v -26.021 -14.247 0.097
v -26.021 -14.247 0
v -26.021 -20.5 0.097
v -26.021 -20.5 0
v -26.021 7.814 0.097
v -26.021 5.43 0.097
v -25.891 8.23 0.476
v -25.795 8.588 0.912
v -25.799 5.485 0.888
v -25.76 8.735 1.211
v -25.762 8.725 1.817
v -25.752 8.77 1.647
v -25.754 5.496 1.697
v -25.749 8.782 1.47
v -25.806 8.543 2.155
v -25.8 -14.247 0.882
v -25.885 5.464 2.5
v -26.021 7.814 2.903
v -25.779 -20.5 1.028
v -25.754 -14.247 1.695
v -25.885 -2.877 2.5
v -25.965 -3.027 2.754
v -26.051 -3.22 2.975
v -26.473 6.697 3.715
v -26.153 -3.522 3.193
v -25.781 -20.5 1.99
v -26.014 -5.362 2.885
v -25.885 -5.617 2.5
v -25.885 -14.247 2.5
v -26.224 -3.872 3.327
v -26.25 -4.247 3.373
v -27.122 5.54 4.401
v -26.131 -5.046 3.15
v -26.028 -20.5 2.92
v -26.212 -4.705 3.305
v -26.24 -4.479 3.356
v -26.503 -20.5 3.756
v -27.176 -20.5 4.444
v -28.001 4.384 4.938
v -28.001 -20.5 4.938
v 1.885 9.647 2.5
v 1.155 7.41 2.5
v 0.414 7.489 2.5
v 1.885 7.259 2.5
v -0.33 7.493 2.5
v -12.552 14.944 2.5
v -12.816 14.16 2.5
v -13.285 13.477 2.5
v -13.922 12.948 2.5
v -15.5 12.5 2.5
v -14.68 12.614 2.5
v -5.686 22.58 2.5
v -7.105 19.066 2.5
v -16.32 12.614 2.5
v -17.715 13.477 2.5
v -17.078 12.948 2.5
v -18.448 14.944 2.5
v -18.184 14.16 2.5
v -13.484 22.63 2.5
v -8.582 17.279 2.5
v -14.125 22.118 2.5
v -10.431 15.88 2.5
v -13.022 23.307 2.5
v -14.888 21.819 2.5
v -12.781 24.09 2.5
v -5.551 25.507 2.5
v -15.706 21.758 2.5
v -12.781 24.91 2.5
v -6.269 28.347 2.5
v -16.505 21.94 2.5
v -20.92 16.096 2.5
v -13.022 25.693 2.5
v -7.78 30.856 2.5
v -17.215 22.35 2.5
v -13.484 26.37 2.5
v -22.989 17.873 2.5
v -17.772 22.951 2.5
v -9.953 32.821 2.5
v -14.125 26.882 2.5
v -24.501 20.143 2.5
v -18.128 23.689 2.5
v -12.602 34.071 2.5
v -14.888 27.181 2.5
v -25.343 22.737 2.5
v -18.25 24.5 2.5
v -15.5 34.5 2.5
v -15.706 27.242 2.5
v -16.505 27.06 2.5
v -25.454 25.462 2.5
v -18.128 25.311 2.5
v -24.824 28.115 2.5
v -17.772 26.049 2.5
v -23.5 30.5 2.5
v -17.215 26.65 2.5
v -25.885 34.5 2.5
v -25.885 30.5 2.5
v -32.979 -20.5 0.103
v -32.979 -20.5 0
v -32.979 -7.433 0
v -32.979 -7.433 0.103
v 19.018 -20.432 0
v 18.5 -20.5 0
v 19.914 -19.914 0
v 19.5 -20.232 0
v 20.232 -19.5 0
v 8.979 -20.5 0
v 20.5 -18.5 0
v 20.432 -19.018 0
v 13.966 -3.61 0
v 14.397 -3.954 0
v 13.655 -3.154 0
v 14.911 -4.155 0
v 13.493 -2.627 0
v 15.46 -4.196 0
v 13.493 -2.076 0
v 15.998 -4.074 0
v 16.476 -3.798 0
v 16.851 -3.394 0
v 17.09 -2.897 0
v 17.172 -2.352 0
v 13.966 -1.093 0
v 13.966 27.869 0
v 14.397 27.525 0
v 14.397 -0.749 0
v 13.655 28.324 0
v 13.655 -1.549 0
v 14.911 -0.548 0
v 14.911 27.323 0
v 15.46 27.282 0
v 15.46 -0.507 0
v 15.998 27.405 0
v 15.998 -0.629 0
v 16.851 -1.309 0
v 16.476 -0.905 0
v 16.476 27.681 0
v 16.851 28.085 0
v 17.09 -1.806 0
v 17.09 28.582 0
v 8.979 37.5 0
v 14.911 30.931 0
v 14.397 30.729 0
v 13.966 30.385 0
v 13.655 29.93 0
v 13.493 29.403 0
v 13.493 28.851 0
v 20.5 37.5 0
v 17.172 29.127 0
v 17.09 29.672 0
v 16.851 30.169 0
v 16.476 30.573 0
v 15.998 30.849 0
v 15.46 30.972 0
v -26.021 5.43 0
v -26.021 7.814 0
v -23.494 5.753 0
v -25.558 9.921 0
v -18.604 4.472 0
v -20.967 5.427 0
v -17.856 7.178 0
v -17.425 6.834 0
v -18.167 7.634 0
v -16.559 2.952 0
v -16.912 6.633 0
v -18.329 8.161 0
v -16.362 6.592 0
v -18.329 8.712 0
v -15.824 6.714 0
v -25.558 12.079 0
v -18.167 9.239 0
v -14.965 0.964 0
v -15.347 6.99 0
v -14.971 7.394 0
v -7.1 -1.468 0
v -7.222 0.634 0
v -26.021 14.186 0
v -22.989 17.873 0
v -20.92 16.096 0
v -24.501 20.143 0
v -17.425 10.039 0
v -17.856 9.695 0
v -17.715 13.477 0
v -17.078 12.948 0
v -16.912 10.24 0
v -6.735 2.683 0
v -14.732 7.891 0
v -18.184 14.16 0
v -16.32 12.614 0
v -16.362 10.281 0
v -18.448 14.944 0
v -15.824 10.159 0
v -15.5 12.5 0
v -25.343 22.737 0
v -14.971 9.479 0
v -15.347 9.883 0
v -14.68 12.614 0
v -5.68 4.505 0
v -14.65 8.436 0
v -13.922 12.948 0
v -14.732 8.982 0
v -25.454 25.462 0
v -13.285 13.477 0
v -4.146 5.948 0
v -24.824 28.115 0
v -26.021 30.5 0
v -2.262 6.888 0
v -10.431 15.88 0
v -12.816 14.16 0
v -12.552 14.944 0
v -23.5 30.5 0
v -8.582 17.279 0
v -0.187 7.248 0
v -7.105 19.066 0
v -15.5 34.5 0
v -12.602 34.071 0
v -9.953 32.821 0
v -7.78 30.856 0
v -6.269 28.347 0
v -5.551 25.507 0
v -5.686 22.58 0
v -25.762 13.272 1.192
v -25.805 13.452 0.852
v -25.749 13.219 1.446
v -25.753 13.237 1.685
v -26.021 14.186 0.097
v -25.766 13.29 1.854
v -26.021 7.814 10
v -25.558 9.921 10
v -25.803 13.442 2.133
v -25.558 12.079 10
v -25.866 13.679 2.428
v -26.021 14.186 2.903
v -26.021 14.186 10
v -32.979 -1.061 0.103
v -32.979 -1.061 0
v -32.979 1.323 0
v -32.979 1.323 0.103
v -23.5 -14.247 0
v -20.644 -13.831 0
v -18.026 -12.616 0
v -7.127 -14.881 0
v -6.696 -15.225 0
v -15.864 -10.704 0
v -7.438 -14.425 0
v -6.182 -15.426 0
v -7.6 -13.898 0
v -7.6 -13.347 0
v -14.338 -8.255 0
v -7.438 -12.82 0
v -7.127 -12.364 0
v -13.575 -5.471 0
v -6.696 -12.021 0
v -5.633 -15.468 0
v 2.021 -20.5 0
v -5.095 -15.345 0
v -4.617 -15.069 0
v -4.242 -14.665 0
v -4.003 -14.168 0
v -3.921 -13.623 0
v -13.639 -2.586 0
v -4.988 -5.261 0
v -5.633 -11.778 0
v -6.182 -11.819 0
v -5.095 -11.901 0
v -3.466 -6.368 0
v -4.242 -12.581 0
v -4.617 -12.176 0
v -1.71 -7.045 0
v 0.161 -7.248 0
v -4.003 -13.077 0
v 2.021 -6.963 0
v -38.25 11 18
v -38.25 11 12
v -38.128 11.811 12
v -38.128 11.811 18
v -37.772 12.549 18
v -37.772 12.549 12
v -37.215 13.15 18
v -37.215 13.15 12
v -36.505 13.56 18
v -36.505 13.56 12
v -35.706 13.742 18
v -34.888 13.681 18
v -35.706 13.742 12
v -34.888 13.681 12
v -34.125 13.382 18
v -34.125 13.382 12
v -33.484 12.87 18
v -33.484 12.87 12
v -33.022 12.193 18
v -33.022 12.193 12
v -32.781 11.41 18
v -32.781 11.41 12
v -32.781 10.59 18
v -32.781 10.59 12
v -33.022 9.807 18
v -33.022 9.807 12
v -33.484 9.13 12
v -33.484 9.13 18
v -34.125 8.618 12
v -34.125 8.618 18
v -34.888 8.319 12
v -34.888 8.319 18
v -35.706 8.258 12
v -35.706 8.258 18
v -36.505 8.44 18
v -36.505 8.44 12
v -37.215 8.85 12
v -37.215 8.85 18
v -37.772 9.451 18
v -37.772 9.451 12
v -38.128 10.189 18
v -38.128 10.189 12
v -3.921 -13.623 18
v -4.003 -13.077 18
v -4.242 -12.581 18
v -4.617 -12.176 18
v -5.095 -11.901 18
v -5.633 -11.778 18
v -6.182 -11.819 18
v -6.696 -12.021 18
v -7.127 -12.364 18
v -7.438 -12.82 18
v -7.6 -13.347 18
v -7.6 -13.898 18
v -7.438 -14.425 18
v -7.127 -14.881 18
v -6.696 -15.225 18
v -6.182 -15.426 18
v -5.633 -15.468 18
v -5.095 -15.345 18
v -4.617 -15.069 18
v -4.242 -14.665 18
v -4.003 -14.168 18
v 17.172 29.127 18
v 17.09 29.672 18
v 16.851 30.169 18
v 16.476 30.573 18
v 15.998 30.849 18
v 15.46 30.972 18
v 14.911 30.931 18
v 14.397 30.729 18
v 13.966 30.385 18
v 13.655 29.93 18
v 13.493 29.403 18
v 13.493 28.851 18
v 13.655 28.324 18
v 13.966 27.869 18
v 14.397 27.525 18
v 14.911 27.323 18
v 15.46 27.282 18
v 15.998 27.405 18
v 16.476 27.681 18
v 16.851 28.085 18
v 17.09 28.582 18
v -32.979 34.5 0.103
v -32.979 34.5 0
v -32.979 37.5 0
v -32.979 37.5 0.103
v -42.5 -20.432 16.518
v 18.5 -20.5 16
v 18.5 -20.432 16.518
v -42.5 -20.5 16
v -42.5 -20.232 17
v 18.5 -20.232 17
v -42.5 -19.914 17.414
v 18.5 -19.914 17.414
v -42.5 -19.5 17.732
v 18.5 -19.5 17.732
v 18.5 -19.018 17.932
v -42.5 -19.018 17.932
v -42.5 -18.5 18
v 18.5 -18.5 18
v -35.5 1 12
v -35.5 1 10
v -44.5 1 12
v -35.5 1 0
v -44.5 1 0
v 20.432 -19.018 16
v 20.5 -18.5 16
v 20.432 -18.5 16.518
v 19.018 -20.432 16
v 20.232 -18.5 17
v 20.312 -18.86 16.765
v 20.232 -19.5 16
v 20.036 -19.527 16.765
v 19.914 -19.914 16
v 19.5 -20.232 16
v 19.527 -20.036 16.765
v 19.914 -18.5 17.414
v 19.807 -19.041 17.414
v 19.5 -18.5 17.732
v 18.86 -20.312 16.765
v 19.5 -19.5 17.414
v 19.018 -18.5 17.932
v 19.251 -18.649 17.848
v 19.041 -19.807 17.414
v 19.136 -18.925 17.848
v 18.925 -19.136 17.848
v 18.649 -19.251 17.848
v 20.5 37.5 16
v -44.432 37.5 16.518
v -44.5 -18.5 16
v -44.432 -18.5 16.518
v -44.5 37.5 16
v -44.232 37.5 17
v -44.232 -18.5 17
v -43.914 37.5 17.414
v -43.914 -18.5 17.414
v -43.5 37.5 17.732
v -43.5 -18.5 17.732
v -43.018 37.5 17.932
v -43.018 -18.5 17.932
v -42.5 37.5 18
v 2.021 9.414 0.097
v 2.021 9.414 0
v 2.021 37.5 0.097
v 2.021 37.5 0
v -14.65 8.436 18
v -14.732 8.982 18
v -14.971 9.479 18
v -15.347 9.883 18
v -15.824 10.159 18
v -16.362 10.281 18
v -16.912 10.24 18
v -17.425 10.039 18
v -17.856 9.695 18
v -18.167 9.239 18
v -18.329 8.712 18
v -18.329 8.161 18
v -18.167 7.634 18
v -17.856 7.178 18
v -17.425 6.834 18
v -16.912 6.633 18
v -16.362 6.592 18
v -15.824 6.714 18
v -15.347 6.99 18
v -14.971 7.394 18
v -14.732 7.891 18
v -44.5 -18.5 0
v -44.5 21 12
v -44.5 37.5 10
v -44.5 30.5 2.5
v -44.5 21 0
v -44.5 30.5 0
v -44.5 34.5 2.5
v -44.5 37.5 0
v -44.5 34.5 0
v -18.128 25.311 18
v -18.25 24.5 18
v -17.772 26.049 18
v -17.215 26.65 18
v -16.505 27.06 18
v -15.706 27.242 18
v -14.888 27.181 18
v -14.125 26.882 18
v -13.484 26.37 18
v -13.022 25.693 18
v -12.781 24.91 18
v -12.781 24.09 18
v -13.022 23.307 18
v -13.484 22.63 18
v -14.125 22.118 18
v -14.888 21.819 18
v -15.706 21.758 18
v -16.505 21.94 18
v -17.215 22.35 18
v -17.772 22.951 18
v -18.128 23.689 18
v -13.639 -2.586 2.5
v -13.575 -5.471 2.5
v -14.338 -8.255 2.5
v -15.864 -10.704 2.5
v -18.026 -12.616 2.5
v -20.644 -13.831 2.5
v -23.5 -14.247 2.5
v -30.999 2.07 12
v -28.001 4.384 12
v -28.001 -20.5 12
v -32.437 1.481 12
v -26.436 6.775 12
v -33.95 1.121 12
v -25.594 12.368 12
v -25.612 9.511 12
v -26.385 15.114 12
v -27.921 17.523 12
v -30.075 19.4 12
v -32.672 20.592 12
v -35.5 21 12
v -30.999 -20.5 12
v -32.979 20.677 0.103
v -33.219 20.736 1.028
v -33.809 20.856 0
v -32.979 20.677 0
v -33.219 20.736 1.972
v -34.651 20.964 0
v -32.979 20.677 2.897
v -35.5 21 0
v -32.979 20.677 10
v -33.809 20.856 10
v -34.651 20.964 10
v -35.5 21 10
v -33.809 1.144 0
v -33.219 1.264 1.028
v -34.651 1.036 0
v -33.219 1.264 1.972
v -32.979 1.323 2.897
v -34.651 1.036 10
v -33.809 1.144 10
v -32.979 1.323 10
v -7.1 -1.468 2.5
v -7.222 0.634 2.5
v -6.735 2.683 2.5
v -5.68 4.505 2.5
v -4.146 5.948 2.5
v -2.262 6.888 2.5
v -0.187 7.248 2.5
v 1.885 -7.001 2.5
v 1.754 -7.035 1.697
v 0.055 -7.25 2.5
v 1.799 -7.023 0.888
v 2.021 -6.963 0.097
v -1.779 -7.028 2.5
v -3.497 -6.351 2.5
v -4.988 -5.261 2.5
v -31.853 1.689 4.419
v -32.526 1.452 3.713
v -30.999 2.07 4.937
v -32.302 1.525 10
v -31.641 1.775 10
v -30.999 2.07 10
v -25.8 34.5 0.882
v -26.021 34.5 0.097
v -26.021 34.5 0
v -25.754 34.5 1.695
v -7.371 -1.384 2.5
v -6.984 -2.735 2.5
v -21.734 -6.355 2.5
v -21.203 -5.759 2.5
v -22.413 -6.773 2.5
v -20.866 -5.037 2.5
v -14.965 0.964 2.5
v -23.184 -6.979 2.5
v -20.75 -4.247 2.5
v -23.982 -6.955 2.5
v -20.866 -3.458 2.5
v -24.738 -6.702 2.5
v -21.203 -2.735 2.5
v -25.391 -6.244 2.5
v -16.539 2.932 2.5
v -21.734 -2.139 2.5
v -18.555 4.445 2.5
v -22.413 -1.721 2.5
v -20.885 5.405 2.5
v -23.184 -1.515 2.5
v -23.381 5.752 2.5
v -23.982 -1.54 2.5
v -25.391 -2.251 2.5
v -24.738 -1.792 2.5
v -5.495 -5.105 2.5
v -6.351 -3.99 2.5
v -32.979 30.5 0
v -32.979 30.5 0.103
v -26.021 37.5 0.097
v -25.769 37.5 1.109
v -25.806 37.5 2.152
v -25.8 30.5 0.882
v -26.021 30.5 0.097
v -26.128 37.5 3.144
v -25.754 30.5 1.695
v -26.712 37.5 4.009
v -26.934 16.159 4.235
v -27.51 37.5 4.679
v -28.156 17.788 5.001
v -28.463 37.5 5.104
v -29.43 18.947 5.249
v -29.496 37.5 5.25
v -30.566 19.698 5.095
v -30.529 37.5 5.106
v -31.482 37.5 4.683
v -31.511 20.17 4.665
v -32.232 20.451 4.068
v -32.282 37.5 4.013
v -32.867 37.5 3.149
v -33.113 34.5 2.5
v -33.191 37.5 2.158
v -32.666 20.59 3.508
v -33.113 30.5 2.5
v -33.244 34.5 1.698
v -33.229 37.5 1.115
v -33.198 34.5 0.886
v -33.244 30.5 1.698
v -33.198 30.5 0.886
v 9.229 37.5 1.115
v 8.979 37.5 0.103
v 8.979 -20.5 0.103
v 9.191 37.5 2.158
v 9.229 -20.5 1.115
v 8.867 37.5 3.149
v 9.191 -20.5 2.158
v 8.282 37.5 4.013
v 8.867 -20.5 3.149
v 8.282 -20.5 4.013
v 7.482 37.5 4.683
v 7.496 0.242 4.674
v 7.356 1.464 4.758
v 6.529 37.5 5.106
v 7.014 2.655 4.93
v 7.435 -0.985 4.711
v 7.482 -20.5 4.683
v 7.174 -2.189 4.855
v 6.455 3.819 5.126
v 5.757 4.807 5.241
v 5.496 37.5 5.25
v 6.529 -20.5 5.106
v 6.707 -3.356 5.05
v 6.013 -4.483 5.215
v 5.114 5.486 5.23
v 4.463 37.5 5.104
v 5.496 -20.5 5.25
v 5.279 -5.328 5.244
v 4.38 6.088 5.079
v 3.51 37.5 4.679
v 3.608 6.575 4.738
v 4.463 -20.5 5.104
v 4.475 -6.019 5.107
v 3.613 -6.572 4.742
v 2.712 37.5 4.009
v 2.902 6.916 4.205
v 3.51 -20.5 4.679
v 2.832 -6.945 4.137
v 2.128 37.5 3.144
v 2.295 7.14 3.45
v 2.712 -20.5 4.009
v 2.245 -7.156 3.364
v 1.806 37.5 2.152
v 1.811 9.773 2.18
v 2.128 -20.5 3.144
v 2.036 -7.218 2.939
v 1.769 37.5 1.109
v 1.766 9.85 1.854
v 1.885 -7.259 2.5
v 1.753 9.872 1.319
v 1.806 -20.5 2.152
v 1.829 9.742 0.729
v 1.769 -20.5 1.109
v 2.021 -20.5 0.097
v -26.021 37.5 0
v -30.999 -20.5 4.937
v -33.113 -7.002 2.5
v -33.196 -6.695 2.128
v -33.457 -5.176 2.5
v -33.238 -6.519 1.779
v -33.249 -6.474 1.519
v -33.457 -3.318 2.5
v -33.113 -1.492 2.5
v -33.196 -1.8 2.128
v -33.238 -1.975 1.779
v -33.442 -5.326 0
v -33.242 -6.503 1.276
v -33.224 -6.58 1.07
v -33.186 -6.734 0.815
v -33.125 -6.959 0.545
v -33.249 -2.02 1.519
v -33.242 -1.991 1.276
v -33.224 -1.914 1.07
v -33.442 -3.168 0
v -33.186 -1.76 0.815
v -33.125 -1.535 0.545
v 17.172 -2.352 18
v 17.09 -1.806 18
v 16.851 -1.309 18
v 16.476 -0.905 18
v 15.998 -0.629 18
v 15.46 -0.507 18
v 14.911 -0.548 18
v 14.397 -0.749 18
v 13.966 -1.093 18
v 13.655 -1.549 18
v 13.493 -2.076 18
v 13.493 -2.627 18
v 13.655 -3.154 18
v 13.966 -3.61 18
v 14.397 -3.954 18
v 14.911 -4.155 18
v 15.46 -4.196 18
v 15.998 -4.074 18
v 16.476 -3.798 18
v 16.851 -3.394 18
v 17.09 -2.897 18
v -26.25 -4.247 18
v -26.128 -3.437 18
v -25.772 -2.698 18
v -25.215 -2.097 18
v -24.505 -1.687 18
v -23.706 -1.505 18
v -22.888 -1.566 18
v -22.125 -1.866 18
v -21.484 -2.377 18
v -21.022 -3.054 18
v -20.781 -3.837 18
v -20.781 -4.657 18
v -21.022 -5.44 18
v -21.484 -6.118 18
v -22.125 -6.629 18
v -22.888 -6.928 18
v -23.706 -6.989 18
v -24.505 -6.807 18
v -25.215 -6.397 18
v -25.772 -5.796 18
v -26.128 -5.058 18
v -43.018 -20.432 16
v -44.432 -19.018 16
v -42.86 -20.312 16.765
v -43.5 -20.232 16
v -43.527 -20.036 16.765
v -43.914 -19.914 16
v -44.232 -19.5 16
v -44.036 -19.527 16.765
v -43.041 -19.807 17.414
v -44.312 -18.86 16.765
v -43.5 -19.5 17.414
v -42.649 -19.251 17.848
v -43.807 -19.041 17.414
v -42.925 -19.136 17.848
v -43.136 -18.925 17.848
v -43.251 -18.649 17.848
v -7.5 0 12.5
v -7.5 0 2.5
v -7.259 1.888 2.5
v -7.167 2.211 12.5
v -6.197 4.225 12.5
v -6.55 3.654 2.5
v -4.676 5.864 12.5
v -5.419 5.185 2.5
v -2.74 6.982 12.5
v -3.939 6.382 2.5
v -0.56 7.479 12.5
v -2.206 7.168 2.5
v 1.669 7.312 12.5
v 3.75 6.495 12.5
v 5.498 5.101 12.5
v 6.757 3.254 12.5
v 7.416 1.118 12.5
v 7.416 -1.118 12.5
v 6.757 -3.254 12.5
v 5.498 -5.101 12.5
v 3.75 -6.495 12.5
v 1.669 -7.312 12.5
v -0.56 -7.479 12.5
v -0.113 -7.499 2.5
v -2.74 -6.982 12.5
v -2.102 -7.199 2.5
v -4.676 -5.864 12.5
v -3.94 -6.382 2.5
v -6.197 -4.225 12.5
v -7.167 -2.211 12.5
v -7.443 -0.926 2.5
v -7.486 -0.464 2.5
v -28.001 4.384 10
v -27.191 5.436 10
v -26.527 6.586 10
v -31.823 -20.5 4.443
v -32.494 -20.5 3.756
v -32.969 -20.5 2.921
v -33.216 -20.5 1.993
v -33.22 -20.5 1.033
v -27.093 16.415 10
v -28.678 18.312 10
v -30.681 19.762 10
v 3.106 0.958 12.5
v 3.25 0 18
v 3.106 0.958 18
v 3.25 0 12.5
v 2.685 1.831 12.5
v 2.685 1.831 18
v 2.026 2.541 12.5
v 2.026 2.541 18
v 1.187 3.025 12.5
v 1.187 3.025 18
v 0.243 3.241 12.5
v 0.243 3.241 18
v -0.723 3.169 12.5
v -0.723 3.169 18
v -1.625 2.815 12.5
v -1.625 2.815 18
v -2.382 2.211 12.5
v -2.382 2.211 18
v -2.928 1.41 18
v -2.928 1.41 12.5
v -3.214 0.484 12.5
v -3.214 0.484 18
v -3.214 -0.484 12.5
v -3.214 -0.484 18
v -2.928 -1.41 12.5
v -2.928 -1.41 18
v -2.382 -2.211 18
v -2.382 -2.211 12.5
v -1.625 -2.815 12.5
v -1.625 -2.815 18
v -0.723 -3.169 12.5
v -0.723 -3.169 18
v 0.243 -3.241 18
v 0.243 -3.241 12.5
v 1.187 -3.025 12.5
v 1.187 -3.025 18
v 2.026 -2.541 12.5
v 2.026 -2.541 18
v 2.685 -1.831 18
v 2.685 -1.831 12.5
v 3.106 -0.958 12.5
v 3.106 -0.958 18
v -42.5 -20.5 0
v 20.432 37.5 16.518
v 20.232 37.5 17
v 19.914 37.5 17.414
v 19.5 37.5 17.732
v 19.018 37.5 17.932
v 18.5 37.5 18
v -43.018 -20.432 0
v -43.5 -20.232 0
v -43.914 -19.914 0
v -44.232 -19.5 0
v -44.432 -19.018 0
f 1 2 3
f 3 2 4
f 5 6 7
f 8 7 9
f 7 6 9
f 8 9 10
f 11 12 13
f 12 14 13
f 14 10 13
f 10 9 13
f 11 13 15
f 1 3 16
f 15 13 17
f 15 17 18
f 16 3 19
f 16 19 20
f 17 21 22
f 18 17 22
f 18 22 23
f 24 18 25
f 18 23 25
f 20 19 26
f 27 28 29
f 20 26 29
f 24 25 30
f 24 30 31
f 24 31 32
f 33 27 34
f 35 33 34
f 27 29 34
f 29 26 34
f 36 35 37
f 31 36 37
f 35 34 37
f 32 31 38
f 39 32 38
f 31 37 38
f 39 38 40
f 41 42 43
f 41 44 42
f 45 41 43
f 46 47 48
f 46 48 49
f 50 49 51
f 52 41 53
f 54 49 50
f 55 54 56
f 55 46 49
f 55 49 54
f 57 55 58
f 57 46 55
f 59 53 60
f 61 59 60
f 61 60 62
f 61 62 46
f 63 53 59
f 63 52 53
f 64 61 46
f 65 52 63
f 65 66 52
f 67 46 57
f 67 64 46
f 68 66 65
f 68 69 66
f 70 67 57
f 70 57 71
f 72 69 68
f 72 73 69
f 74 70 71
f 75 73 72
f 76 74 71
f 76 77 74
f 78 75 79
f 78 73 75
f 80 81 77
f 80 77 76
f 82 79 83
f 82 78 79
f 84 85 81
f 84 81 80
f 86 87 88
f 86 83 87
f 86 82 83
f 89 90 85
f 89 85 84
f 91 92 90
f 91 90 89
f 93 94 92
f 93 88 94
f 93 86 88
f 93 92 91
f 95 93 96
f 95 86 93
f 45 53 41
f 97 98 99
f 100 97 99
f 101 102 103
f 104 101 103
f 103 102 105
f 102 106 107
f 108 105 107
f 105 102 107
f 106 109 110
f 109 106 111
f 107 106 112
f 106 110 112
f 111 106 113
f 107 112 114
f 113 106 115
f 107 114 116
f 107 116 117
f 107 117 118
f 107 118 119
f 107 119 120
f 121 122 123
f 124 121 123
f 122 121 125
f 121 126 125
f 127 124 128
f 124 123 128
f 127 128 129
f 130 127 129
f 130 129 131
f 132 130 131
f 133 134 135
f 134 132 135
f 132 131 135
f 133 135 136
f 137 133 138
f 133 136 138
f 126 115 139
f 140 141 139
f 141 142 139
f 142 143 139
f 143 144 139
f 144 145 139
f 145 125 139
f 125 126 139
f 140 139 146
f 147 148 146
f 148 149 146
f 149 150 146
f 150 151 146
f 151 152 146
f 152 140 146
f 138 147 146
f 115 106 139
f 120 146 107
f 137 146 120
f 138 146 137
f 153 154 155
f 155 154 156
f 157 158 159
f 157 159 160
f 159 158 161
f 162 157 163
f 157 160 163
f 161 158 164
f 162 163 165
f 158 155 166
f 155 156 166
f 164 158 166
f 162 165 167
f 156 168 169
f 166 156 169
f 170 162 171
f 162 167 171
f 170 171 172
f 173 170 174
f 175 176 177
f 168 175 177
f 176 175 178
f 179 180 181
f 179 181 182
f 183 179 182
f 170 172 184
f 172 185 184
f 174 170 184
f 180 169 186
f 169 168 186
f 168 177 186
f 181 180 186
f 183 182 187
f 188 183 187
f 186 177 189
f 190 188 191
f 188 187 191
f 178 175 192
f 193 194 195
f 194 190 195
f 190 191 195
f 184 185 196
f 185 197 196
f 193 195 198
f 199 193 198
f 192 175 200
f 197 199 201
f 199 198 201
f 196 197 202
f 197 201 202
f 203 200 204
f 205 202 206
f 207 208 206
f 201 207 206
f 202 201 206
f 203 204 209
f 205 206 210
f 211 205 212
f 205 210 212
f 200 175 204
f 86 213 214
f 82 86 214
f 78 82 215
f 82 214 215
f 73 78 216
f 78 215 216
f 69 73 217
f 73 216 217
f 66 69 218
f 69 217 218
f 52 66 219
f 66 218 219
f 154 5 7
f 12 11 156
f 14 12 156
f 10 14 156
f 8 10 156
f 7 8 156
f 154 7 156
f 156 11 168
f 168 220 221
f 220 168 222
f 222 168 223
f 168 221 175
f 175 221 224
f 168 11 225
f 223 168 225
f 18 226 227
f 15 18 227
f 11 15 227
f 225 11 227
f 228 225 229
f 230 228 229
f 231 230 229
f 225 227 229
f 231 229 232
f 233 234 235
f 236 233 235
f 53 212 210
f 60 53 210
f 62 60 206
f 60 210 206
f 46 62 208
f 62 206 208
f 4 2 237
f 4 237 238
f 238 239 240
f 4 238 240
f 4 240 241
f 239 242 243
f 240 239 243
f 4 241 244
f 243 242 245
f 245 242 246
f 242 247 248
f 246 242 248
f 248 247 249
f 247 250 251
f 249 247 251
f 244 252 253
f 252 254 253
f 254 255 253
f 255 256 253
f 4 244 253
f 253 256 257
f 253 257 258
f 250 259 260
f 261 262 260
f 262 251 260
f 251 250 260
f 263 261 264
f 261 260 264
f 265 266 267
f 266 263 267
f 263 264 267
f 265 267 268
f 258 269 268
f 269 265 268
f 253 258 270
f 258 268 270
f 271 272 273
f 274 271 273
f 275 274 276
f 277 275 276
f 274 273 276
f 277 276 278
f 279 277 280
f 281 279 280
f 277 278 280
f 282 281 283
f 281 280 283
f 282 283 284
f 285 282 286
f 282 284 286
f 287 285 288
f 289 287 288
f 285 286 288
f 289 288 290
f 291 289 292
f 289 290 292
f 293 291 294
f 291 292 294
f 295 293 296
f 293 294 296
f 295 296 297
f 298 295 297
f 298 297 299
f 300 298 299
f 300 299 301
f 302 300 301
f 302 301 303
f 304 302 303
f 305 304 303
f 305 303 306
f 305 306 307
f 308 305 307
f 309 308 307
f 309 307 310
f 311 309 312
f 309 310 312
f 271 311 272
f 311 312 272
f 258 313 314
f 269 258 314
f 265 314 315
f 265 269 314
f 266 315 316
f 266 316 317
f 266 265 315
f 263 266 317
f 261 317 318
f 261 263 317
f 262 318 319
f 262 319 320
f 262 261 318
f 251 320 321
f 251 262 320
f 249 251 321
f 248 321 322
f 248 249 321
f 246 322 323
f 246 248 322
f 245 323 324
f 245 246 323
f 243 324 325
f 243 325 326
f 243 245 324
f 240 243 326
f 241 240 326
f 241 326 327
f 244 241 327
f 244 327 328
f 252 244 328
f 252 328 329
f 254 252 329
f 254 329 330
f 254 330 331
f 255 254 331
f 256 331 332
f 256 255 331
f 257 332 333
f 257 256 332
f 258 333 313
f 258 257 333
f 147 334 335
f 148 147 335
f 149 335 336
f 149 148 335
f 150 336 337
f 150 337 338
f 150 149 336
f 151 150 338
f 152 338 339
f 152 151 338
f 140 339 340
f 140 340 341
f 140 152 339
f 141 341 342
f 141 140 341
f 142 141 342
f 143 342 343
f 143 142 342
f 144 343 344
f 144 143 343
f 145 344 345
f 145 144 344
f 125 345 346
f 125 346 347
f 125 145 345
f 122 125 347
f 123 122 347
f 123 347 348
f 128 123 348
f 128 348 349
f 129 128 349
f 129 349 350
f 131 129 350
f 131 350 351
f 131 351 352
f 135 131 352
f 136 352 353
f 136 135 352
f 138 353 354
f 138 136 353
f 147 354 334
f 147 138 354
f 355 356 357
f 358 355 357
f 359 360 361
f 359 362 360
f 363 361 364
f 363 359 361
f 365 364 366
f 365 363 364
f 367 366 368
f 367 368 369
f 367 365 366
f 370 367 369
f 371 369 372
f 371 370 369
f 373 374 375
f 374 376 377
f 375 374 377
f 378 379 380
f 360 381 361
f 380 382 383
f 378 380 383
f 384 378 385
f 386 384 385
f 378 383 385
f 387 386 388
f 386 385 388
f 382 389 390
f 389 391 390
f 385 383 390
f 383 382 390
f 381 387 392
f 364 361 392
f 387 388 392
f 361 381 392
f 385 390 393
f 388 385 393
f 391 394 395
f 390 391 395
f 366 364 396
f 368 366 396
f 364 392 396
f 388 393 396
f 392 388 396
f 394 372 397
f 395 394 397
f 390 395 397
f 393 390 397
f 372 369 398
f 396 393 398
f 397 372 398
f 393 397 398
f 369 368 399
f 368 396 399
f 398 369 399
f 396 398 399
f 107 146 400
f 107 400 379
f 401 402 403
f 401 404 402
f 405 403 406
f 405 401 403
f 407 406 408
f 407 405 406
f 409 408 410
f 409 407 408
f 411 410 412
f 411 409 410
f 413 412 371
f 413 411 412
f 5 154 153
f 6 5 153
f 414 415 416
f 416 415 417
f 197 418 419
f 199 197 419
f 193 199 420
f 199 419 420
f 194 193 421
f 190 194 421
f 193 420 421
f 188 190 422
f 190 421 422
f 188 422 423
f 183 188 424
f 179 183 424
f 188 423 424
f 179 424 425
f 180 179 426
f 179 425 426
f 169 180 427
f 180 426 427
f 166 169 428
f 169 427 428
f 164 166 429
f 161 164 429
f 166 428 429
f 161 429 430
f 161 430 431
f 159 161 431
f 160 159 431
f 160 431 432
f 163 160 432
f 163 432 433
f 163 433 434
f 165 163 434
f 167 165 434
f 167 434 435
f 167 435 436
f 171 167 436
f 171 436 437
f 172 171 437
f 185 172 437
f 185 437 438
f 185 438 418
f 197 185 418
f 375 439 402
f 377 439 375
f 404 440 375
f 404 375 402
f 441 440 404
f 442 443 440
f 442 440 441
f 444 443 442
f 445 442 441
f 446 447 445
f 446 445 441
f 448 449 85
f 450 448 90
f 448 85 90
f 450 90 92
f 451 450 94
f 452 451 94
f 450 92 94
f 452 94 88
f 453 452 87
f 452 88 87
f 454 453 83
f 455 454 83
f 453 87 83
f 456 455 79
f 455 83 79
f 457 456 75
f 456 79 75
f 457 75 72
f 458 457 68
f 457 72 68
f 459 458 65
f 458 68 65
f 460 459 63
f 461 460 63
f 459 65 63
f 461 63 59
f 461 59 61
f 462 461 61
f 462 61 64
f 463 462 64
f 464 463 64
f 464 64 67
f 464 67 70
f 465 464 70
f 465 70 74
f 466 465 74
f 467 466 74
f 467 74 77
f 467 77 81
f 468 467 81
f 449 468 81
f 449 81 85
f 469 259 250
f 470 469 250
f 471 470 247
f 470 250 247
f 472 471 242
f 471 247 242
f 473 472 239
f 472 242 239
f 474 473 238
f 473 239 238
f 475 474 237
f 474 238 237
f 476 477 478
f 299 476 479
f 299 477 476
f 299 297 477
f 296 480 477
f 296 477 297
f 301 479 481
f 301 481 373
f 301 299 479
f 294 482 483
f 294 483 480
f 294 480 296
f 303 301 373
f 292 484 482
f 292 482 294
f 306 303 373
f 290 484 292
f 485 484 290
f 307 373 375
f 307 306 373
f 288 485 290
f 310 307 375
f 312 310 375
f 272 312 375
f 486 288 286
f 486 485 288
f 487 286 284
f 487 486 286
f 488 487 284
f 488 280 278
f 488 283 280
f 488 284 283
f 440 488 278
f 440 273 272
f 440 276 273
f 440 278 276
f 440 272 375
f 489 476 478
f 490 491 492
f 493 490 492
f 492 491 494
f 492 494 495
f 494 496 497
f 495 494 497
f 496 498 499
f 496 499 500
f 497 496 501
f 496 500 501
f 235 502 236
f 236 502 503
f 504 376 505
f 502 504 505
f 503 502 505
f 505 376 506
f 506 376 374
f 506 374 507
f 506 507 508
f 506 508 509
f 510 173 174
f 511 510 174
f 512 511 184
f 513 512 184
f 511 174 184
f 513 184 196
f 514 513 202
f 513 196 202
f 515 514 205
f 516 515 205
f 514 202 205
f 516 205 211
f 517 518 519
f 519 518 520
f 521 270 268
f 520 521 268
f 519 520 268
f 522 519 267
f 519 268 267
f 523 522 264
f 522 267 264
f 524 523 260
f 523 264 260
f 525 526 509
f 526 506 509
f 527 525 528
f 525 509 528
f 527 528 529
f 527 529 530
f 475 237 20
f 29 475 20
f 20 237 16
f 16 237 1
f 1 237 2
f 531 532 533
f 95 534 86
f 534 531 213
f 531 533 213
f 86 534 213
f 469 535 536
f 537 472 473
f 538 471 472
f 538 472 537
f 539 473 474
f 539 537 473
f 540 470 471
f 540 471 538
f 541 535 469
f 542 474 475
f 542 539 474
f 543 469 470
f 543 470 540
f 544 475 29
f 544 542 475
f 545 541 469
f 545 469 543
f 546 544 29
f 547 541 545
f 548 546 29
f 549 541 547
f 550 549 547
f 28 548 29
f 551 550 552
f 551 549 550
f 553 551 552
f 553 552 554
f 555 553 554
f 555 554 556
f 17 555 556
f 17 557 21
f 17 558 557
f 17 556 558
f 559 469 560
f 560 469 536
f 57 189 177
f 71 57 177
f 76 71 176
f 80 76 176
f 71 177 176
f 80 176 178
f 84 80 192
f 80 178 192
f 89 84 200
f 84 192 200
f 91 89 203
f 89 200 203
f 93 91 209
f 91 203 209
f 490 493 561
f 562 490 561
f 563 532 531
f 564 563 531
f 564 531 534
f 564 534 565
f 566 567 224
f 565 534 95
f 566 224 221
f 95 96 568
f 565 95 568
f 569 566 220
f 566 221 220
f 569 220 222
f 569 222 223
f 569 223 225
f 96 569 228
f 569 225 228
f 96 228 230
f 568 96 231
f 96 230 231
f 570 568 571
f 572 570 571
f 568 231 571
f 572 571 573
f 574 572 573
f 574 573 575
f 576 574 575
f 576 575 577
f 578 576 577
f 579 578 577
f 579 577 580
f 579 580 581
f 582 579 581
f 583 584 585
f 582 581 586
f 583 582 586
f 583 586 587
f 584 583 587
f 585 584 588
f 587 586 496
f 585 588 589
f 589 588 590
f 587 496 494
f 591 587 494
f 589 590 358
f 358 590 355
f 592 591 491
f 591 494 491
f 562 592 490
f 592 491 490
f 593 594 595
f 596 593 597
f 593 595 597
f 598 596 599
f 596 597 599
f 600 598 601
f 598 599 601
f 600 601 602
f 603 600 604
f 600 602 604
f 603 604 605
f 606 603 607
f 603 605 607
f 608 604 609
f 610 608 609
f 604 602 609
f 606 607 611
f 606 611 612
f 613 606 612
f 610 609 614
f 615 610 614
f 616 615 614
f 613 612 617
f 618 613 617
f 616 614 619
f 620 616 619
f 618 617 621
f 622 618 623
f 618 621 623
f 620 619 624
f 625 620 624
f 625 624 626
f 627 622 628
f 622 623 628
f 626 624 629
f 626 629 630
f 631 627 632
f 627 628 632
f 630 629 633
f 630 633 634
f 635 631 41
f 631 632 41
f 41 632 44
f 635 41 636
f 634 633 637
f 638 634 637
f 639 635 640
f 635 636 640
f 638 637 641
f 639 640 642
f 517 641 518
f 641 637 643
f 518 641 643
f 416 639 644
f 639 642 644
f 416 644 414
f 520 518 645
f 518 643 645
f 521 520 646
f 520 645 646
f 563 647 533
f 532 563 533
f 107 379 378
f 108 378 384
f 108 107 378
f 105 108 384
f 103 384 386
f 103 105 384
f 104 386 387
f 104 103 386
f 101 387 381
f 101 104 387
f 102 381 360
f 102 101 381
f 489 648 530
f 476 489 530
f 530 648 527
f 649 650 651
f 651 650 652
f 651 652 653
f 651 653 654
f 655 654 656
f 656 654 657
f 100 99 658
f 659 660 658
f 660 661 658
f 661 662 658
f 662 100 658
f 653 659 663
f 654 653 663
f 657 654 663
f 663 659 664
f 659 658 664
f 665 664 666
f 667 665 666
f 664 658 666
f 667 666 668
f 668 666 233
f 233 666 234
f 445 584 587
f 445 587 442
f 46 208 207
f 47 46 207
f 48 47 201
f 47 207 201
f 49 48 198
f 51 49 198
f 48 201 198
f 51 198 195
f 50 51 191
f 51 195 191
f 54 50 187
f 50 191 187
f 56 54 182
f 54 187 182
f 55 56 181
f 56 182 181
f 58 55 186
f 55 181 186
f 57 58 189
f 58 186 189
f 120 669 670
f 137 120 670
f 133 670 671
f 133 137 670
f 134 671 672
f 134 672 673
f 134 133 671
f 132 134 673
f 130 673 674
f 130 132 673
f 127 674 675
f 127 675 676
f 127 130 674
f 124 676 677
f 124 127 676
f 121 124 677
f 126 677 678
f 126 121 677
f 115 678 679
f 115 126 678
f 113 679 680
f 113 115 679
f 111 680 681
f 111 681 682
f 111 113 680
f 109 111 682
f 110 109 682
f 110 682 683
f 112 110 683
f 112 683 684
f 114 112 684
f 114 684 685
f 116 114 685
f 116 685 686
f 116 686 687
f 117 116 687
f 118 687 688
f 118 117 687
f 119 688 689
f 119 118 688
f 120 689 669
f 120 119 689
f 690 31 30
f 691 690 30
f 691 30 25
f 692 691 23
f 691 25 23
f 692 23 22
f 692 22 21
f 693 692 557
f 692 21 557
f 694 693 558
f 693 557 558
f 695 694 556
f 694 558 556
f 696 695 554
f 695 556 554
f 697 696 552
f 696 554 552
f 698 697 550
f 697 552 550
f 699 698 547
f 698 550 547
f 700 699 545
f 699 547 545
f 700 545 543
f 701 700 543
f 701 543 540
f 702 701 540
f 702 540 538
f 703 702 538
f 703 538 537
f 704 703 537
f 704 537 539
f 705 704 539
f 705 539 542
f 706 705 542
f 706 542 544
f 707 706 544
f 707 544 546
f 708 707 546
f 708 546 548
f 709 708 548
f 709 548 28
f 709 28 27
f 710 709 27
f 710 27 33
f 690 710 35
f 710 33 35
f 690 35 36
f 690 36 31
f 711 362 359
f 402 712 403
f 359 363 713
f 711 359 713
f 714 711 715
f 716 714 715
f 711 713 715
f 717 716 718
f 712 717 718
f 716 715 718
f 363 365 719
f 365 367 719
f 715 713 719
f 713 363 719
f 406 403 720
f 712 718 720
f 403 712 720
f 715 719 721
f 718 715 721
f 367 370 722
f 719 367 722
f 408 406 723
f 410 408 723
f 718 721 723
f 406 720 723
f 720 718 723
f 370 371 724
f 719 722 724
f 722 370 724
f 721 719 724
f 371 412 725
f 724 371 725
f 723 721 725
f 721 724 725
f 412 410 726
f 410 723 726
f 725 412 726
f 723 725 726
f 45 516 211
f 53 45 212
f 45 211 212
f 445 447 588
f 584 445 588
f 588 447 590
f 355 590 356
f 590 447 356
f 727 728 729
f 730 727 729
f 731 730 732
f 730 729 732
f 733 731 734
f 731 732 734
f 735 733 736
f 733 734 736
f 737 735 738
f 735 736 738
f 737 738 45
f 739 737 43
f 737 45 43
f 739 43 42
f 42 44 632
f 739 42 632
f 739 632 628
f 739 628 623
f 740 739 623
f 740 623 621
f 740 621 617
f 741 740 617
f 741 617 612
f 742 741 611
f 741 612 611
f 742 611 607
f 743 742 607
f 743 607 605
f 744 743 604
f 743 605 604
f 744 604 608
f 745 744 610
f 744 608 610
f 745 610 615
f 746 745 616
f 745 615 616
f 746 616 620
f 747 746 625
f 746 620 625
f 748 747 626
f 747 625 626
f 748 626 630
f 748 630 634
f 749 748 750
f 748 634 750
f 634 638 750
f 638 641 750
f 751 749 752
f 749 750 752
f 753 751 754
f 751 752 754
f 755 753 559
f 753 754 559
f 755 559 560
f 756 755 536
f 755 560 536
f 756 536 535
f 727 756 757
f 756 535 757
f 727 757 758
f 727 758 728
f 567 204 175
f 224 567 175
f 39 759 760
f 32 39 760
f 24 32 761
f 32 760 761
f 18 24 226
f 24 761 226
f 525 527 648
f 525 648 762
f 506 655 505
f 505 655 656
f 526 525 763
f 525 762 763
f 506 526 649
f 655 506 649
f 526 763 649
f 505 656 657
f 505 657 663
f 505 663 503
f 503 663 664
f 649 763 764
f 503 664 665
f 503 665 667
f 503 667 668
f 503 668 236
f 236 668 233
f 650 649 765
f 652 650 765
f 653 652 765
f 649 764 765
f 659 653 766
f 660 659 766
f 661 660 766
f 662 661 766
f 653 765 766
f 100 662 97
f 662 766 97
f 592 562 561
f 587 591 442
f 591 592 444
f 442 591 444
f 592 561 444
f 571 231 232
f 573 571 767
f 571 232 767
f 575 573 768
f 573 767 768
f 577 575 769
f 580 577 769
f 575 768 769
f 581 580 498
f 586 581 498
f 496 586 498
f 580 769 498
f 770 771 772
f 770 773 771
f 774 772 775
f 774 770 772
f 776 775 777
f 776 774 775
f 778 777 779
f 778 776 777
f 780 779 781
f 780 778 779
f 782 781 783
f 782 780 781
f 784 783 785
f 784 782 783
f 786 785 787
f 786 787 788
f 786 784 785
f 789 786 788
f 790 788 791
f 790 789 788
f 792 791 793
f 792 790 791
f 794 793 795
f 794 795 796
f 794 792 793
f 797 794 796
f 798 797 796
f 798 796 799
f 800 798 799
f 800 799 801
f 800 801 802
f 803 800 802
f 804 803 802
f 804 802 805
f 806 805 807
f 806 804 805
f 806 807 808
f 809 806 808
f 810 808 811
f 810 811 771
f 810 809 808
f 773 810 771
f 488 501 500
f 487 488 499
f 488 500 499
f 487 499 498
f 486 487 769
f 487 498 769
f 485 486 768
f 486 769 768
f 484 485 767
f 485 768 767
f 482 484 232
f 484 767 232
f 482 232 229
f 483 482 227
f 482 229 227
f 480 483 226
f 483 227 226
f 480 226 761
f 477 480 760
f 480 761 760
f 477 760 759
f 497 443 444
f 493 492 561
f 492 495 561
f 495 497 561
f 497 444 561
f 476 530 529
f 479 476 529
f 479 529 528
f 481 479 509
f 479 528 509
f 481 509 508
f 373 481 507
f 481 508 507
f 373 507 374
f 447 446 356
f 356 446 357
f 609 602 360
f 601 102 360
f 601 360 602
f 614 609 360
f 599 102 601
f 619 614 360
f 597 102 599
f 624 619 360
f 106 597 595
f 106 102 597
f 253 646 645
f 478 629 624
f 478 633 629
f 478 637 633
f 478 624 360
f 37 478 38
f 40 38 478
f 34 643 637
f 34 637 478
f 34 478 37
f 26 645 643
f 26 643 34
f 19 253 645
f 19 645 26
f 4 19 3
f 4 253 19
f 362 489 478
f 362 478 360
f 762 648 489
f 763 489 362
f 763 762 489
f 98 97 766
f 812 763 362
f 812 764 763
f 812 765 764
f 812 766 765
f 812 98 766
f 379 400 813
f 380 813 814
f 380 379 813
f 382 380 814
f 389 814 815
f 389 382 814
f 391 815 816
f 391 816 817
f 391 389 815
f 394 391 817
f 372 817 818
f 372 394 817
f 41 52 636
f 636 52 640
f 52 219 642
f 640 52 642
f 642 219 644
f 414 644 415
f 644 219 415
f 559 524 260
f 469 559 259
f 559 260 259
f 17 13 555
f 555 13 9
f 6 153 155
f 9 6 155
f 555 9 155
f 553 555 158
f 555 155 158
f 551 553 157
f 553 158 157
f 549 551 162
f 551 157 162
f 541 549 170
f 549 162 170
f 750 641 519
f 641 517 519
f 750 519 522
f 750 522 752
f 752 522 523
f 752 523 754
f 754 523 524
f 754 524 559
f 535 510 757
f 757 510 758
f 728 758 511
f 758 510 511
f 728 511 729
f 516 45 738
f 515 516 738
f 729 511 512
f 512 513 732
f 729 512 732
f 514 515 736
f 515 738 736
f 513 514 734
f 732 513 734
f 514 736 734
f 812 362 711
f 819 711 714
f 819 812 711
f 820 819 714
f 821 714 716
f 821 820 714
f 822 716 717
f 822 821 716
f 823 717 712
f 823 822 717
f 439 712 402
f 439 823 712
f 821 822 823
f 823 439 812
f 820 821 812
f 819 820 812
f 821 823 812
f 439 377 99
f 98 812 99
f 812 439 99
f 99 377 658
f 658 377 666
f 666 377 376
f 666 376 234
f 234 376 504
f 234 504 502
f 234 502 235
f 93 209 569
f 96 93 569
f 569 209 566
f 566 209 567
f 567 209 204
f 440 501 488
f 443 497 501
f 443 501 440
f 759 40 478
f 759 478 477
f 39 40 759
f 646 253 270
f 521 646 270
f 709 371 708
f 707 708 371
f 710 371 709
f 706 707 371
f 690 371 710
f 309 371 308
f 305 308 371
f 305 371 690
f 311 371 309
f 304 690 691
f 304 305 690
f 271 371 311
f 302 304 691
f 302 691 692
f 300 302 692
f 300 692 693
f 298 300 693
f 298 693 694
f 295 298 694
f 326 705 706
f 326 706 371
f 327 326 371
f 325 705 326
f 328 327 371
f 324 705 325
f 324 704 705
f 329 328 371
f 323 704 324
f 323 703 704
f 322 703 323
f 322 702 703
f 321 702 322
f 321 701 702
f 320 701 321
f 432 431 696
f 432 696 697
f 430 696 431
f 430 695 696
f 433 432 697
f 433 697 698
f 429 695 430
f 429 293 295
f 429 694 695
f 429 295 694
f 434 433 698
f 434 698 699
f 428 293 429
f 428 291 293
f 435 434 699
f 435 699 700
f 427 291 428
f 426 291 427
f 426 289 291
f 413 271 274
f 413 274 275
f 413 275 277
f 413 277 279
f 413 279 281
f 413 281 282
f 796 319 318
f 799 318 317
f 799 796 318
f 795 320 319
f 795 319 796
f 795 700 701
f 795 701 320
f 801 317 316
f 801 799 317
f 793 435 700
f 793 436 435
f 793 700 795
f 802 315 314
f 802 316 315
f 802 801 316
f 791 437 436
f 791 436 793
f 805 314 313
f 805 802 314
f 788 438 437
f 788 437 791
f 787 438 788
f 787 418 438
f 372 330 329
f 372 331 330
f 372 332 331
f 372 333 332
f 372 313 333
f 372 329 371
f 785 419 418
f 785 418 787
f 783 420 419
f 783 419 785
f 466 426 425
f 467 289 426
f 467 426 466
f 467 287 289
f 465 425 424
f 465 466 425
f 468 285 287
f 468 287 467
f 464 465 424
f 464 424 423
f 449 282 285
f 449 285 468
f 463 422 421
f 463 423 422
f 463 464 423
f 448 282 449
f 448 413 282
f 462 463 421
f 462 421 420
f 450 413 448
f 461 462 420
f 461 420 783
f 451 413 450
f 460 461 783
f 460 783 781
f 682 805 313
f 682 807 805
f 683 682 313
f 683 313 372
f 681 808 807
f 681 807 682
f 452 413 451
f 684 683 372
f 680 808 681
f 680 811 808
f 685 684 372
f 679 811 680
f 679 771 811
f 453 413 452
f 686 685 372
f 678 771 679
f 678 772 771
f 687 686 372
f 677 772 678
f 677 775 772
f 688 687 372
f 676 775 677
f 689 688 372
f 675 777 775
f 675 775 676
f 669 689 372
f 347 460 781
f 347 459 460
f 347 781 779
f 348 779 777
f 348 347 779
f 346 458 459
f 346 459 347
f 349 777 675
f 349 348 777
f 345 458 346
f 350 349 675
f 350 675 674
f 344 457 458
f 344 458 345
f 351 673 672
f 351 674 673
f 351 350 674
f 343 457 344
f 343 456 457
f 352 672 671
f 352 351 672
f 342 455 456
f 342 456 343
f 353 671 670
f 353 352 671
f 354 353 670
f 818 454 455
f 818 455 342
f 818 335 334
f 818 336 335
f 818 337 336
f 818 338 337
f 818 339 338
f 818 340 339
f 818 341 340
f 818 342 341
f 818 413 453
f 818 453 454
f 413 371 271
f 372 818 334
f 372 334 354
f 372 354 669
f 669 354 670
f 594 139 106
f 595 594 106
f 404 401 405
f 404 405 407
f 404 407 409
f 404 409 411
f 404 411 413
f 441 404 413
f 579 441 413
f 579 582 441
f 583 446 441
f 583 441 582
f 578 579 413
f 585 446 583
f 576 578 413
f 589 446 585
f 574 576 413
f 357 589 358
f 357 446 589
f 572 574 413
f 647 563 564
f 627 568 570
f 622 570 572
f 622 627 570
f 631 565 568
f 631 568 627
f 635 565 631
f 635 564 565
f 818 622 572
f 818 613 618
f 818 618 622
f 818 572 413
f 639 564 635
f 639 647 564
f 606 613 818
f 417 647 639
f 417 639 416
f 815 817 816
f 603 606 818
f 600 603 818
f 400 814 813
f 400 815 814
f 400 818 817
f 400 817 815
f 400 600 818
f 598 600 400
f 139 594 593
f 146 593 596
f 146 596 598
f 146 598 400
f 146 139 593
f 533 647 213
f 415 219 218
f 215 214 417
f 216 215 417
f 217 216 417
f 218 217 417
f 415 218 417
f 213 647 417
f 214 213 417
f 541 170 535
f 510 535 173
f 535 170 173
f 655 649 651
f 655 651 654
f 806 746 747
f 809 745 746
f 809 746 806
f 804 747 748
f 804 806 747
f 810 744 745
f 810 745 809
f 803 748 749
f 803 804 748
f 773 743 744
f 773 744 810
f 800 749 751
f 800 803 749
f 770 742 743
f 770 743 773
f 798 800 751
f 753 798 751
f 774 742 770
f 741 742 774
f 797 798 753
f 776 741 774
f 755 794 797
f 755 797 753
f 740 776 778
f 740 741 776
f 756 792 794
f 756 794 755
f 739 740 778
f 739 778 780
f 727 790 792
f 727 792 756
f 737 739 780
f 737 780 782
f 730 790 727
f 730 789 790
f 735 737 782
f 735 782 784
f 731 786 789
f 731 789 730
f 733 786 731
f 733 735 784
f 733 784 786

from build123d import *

# Parameters (mm, degrees)
SKETCH1_W             = 11.521135243
SKETCH1_H             = 3
BOSS_EXTRUDE1_DEPTH   = 10
SKETCH1_R             = 1.85
BOSS_EXTRUDE1_2_DEPTH = 10
BOSS_EXTRUDE1_3_DEPTH = 10
BOSS_EXTRUDE1_4_DEPTH = 10
BOSS_EXTRUDE1_5_DEPTH = 10
BOSS_EXTRUDE1_6_DEPTH = 10
SKETCH2_R             = 10
CUT_EXTRUDE1_DEPTH    = 11
SKETCH3_R             = 3.25
BOSS_EXTRUDE2_DEPTH   = 7.5
SKETCH4_R             = 1.85
SKETCH4_R_2           = 3.25
BOSS_EXTRUDE3_DEPTH   = 2
SKETCH5_R             = 3.25
SKETCH5_R_2           = 1.85
BOSS_EXTRUDE4_DEPTH   = 6
FILLET1_R             = 2
SKETCH6_W             = 9
SKETCH6_H             = 20
CUT_EXTRUDE2_DEPTH    = 12
SKETCH7_W             = 2.997729514
SKETCH7_H             = 29.62259405
CUT_EXTRUDE3_DEPTH    = 9.5
SKETCH8_R             = 2.75
CUT_EXTRUDE4_DEPTH    = 6
SKETCH9_R             = 2.75
CUT_EXTRUDE5_DEPTH    = 16.5
SKETCH10_R            = 1.85
CUT_EXTRUDE6_DEPTH    = 25
SKETCH11_R            = 1.85
BOSS_EXTRUDE5_DEPTH   = 18
SKETCH12_R            = 3.75
CUT_EXTRUDE7_DEPTH    = 59
SKETCH13_R            = 7.5
CUT_EXTRUDE8_DEPTH    = 10


with BuildPart() as part:
    # Sketch1 → Boss-Extrude1 (new body)
    with BuildSketch(Plane.XY):
        with Locations((-38.739432378, 36)):
            Rectangle(SKETCH1_W, SKETCH1_H)
    extrude(amount=BOSS_EXTRUDE1_DEPTH)



with BuildPart() as body_2:
    # Sketch1 → Boss-Extrude1 2 (new body)
    with BuildSketch(Plane.XY):
        with BuildLine():
            Line((-26.021135243, 30.5), (-26.021135243, 5.429840229))
            ThreePointArc((-26.021135243, 5.429840229), (-19.754753142, 5.025033011), (-14.965174817, 0.964078321))
            Line((-14.965174817, 0.964078321), (-7.099804938, -1.468083732))
            ThreePointArc((-7.099804938, -1.468083732), (-5.680207241, 4.505301955), (-0.18689792, 7.247590577))
            Line((-0.18689792, 7.247590577), (-7.105071526, 19.066292618))
            ThreePointArc((-7.105071526, 19.066292618), (-9.465636422, 16.525888375), (-12.551889075, 14.944444444))
            ThreePointArc((-12.551889075, 14.944444444), (-15.5, 12.5), (-18.448110925, 14.944444444))
            ThreePointArc((-18.448110925, 14.944444444), (-25.010999441, 21.411166946), (-23.5, 30.5))
            Line((-23.5, 30.5), (-26.021135243, 30.5))
        make_face()
        with Locations((-10.762282528, 8.436432064)):
            Circle(SKETCH1_R, mode=Mode.SUBTRACT)
    extrude(amount=BOSS_EXTRUDE1_2_DEPTH)


with BuildPart() as body_3:
    # Sketch1 → Boss-Extrude1 3 (new body)
    with BuildSketch(Plane.XY):
        with BuildLine():
            Line((-26.021135243, 37.5), (-26.021135243, 34.5))
            Line((-26.021135243, 34.5), (-15.5, 34.5))
            ThreePointArc((-15.5, 34.5), (-7.78005297, 30.856289629), (-5.685956151, 22.58048357))
            Line((-5.685956151, 22.58048357), (2.021135243, 9.414029247))
            Line((2.021135243, 9.414029247), (2.021135243, 37.5))
            Line((2.021135243, 37.5), (-26.021135243, 37.5))
        make_face()
    extrude(amount=BOSS_EXTRUDE1_3_DEPTH)


with BuildPart() as body_4:
    # Sketch1 → Boss-Extrude1 4 (new body)
    with BuildSketch(Plane.XY):
        with BuildLine():
            Line((8.978864757, 37.5), (8.978864757, -20.5))
            Line((8.978864757, -20.5), (18.5, -20.5))
            ThreePointArc((18.5, -20.5), (19.914213562, -19.914213562), (20.5, -18.5))
            Line((20.5, -18.5), (20.5, 37.5))
            Line((20.5, 37.5), (8.978864757, 37.5))
        make_face()
        with Locations((15.322226869, 29.126922543)):
            Circle(SKETCH1_R, mode=Mode.SUBTRACT)
        with Locations((15.322226869, -2.351605773)):
            Circle(SKETCH1_R, mode=Mode.SUBTRACT)
    extrude(amount=BOSS_EXTRUDE1_4_DEPTH)


with BuildPart() as body_5:
    # Sketch1 → Boss-Extrude1 5 (new body)
    with BuildSketch(Plane.XY):
        with BuildLine():
            Line((-26.021135243, -14.247136421), (-26.021135243, -20.5))
            Line((-26.021135243, -20.5), (2.021135243, -20.5))
            Line((2.021135243, -20.5), (2.021135243, -6.962579431))
            ThreePointArc((2.021135243, -6.962579431), (-1.710141081, -7.045418191), (-4.98822277, -5.261191271))
            Line((-4.98822277, -5.261191271), (-13.638901361, -2.586192825))
            ThreePointArc((-13.638901361, -2.586192825), (-15.864247386, -10.70432482), (-23.5, -14.247136421))
            Line((-23.5, -14.247136421), (-26.021135243, -14.247136421))
        make_face()
        with Locations((-5.770802335, -13.622690081)):
            Circle(SKETCH1_R, mode=Mode.SUBTRACT)
    extrude(amount=BOSS_EXTRUDE1_5_DEPTH)


with BuildPart() as body_6:
    # Sketch1 → Boss-Extrude1 6 (new body)
    with BuildSketch(Plane.XY):
        with BuildLine():
            Line((-32.978864757, 12.098351987), (-32.978864757, 30.5))
            Line((-32.978864757, 30.5), (-44.5, 30.5))
            Line((-44.5, 30.5), (-44.5, -18.5))
            ThreePointArc((-44.5, -18.5), (-43.914213562, -19.914213562), (-42.5, -20.5))
            Line((-42.5, -20.5), (-32.978864757, -20.5))
            Line((-32.978864757, -20.5), (-32.978864757, -7.433219111))
            ThreePointArc((-32.978864757, -7.433219111), (-33.5, -4.247136421), (-32.978864757, -1.06105373))
            Line((-32.978864757, -1.06105373), (-32.978864757, 9.901648013))
            ThreePointArc((-32.978864757, 9.901648013), (-38.25, 11), (-32.978864757, 12.098351987))
        make_face()
    extrude(amount=BOSS_EXTRUDE1_6_DEPTH)


with BuildPart() as cut_extrude1_tool:
    # Sketch2 → Cut-Extrude1 (new body, through all)
    with BuildSketch(Plane.XY.offset(10)):
        with Locations((-35.5, 11)):
            Circle(SKETCH2_R)
    extrude(amount=-CUT_EXTRUDE1_DEPTH)


with BuildPart() as body_2_1:
    add(body_2.part)

    # Cut-Extrude1: cut by cut_extrude1_tool
    add(cut_extrude1_tool.part, mode=Mode.SUBTRACT)


with BuildPart() as body_6_1:
    add(body_6.part)

    # Cut-Extrude1: cut by cut_extrude1_tool
    add(cut_extrude1_tool.part, mode=Mode.SUBTRACT)


with BuildPart() as part_1:
    add(part.part)

    add(body_2_1.part)  # Boss-Extrude2 merges body 2

    add(body_3.part)  # Boss-Extrude2 merges body 3

    add(body_4.part)  # Boss-Extrude2 merges body 4

    add(body_5.part)  # Boss-Extrude2 merges body 5

    add(body_6_1.part)  # Boss-Extrude2 merges body 6
    # Sketch3 → Boss-Extrude2 (add)
    with BuildSketch(Plane.XY.offset(10)):
        with BuildLine():
            Line((-32.978864757, 20.67697665), (-32.978864757, 30.5))
            Line((-32.978864757, 30.5), (-44.5, 30.5))
            Line((-44.5, 30.5), (-44.5, 34.5))
            Line((-44.5, 34.5), (-32.978864757, 34.5))
            Line((-32.978864757, 34.5), (-32.978864757, 37.5))
            Line((-32.978864757, 37.5), (-26.021135243, 37.5))
            Line((-26.021135243, 37.5), (-26.021135243, 34.5))
            Line((-26.021135243, 34.5), (-15.5, 34.5))
            ThreePointArc((-15.5, 34.5), (-7.78005297, 30.856289629), (-5.685956151, 22.58048357))
            Line((-5.685956151, 22.58048357), (2.021135243, 9.414029247))
            Line((2.021135243, 9.414029247), (2.021135243, 37.5))
            Line((2.021135243, 37.5), (8.978864757, 37.5))
            Line((8.978864757, 37.5), (8.978864757, -20.5))
            Line((8.978864757, -20.5), (2.021135243, -20.5))
            Line((2.021135243, -20.5), (2.021135243, -6.962579431))
            ThreePointArc((2.021135243, -6.962579431), (-1.710141081, -7.045418191), (-4.98822277, -5.261191271))
            Line((-4.98822277, -5.261191271), (-13.638901361, -2.586192825))
            ThreePointArc((-13.638901361, -2.586192825), (-15.864247386, -10.70432482), (-23.5, -14.247136421))
            Line((-23.5, -14.247136421), (-26.021135243, -14.247136421))
            Line((-26.021135243, -14.247136421), (-26.021135243, -20.5))
            Line((-26.021135243, -20.5), (-32.978864757, -20.5))
            Line((-32.978864757, -20.5), (-32.978864757, -7.433219111))
            ThreePointArc((-32.978864757, -7.433219111), (-33.5, -4.247136421), (-32.978864757, -1.06105373))
            Line((-32.978864757, -1.06105373), (-32.978864757, 1.32302335))
            ThreePointArc((-32.978864757, 1.32302335), (-28.67849532, 3.687881709), (-26.021135243, 7.813917309))
            Line((-26.021135243, 7.813917309), (-26.021135243, 5.429840229))
            ThreePointArc((-26.021135243, 5.429840229), (-19.754753142, 5.025033011), (-14.965174817, 0.964078321))
            Line((-14.965174817, 0.964078321), (-7.099804938, -1.468083732))
            ThreePointArc((-7.099804938, -1.468083732), (-5.680207241, 4.505301955), (-0.18689792, 7.247590577))
            Line((-0.18689792, 7.247590577), (-7.105071526, 19.066292618))
            ThreePointArc((-7.105071526, 19.066292618), (-9.465636422, 16.525888375), (-12.551889075, 14.944444444))
            ThreePointArc((-12.551889075, 14.944444444), (-15.5, 12.5), (-18.448110925, 14.944444444))
            ThreePointArc((-18.448110925, 14.944444444), (-25.010999441, 21.411166946), (-23.5, 30.5))
            Line((-23.5, 30.5), (-26.021135243, 30.5))
            Line((-26.021135243, 30.5), (-26.021135243, 14.186082691))
            ThreePointArc((-26.021135243, 14.186082691), (-28.67849532, 18.312118291), (-32.978864757, 20.67697665))
        make_face()
        Circle(SKETCH3_R, mode=Mode.SUBTRACT)
    extrude(amount=-BOSS_EXTRUDE2_DEPTH)

    # Sketch4 → Boss-Extrude3 (add)
    with BuildSketch(Plane.XY.offset(10)):
        with BuildLine():
            Line((-44.5, 6.641101056), (-44.5, -18.5))
            ThreePointArc((-44.5, -18.5), (-43.914213562, -19.914213562), (-42.5, -20.5))
            Line((-42.5, -20.5), (18.5, -20.5))
            ThreePointArc((18.5, -20.5), (19.914213562, -19.914213562), (20.5, -18.5))
            Line((20.5, -18.5), (20.5, 37.5))
            Line((20.5, 37.5), (-44.5, 37.5))
            Line((-44.5, 37.5), (-44.5, 15.358898944))
            ThreePointArc((-44.5, 15.358898944), (-25.5, 11), (-44.5, 6.641101056))
        make_face()
        with Locations((-10.762282528, 8.436432064)):
            Circle(SKETCH4_R, mode=Mode.SUBTRACT)
        Circle(SKETCH4_R_2, mode=Mode.SUBTRACT)
        with Locations((-5.770802335, -13.622690081)):
            Circle(SKETCH4_R, mode=Mode.SUBTRACT)
        with Locations((15.322226869, -2.351605773)):
            Circle(SKETCH4_R, mode=Mode.SUBTRACT)
        with Locations((15.322226869, 29.126922543)):
            Circle(SKETCH4_R, mode=Mode.SUBTRACT)
    extrude(amount=BOSS_EXTRUDE3_DEPTH)

    # Sketch5 → Boss-Extrude4 (add)
    with BuildSketch(Plane.XY.offset(12)):
        with BuildLine():
            Line((-44.5, 37.5), (20.5, 37.5))
            Line((20.5, 37.5), (20.5, -18.5))
            ThreePointArc((20.5, -18.5), (19.914213562, -19.914213562), (18.5, -20.5))
            Line((18.5, -20.5), (-42.5, -20.5))
            ThreePointArc((-42.5, -20.5), (-43.914213562, -19.914213562), (-44.5, -18.5))
            Line((-44.5, -18.5), (-44.5, 37.5))
        make_face()
        Circle(SKETCH5_R, mode=Mode.SUBTRACT)
        with Locations((-10.762282528, 8.436432064)):
            Circle(SKETCH5_R_2, mode=Mode.SUBTRACT)
        with Locations((15.322226869, 29.126922543)):
            Circle(SKETCH5_R_2, mode=Mode.SUBTRACT)
        with Locations((15.322226869, -2.351605773)):
            Circle(SKETCH5_R_2, mode=Mode.SUBTRACT)
        with Locations((-5.770802335, -13.622690081)):
            Circle(SKETCH5_R_2, mode=Mode.SUBTRACT)
    extrude(amount=BOSS_EXTRUDE4_DEPTH)

    # Fillet1
    fillet1_edges = [part_1.edges().sort_by_distance(p)[0] for p in [
        (-44.5, 9.5, 18),
        (-43.914213562, -19.914213562, 18),
        (-12, -20.5, 18),
        (19.914213562, -19.914213562, 18),
        (20.5, 9.5, 18),
    ]]
    fillet(fillet1_edges, radius=FILLET1_R)

    # Sketch6 → Cut-Extrude2 (cut)
    with BuildSketch(Plane(origin=(0, 0, 0), x_dir=(-1, 0, 0), z_dir=(0, 0, -1))):
        with Locations((40, 11)):
            Rectangle(SKETCH6_W, SKETCH6_H)
    extrude(amount=-CUT_EXTRUDE2_DEPTH, mode=Mode.SUBTRACT)

    # Sketch7 → Cut-Extrude3 (cut)
    with BuildSketch(Plane(origin=(0, 0, 2.5), x_dir=(-1, 0, 0), z_dir=(0, 0, -1))):
        with Locations((29.5, -5.688702975)):
            Rectangle(SKETCH7_W, SKETCH7_H)
    extrude(amount=-CUT_EXTRUDE3_DEPTH, mode=Mode.SUBTRACT)

    # Sketch8 → Cut-Extrude4 (cut)
    with BuildSketch(Plane(origin=(0, 0, 12), x_dir=(-1, 0, 0), z_dir=(0, 0, -1))):
        with Locations((35.5, 11)):
            Circle(SKETCH8_R)
    extrude(amount=-CUT_EXTRUDE4_DEPTH, mode=Mode.SUBTRACT)

    # Sketch9 → Cut-Extrude5 (cut, through all)
    with BuildSketch(Plane(origin=(0, 0, 2.5), x_dir=(-1, 0, 0), z_dir=(0, 0, -1))):
        with Locations((15.5, 24.5)):
            Circle(SKETCH9_R)
        with Locations((23.5, -4.247136421)):
            Circle(SKETCH9_R)
    extrude(amount=-CUT_EXTRUDE5_DEPTH, mode=Mode.SUBTRACT)

    # Sketch10 → Cut-Extrude6 (cut)
    with BuildSketch(Plane.XY.offset(18)):
        with Locations((-16.5, 8.436432064)):
            Circle(SKETCH10_R)
    extrude(amount=-CUT_EXTRUDE6_DEPTH, mode=Mode.SUBTRACT)

    # Sketch11 → Boss-Extrude5 (add, through all)
    with BuildSketch(Plane.XY.offset(18)):
        with Locations((-10.762282528, 8.436432064)):
            Circle(SKETCH11_R)
    extrude(amount=-BOSS_EXTRUDE5_DEPTH)

    # Sketch12 → Cut-Extrude7 (cut, through all)
    with BuildSketch(Plane.XZ.offset(20.5)):
        with Locations((-29.498864757, 1.5)):
            Circle(SKETCH12_R)
        with Locations((5.498864757, 1.5)):
            Circle(SKETCH12_R)
    extrude(amount=-CUT_EXTRUDE7_DEPTH, mode=Mode.SUBTRACT)

    # Sketch13 → Cut-Extrude8 (cut)
    with BuildSketch(Plane(origin=(0, 0, 2.5), x_dir=(-1, 0, 0), z_dir=(0, 0, -1))):
        Circle(SKETCH13_R)
    extrude(amount=-CUT_EXTRUDE8_DEPTH, mode=Mode.SUBTRACT)


solid = part_1.part
